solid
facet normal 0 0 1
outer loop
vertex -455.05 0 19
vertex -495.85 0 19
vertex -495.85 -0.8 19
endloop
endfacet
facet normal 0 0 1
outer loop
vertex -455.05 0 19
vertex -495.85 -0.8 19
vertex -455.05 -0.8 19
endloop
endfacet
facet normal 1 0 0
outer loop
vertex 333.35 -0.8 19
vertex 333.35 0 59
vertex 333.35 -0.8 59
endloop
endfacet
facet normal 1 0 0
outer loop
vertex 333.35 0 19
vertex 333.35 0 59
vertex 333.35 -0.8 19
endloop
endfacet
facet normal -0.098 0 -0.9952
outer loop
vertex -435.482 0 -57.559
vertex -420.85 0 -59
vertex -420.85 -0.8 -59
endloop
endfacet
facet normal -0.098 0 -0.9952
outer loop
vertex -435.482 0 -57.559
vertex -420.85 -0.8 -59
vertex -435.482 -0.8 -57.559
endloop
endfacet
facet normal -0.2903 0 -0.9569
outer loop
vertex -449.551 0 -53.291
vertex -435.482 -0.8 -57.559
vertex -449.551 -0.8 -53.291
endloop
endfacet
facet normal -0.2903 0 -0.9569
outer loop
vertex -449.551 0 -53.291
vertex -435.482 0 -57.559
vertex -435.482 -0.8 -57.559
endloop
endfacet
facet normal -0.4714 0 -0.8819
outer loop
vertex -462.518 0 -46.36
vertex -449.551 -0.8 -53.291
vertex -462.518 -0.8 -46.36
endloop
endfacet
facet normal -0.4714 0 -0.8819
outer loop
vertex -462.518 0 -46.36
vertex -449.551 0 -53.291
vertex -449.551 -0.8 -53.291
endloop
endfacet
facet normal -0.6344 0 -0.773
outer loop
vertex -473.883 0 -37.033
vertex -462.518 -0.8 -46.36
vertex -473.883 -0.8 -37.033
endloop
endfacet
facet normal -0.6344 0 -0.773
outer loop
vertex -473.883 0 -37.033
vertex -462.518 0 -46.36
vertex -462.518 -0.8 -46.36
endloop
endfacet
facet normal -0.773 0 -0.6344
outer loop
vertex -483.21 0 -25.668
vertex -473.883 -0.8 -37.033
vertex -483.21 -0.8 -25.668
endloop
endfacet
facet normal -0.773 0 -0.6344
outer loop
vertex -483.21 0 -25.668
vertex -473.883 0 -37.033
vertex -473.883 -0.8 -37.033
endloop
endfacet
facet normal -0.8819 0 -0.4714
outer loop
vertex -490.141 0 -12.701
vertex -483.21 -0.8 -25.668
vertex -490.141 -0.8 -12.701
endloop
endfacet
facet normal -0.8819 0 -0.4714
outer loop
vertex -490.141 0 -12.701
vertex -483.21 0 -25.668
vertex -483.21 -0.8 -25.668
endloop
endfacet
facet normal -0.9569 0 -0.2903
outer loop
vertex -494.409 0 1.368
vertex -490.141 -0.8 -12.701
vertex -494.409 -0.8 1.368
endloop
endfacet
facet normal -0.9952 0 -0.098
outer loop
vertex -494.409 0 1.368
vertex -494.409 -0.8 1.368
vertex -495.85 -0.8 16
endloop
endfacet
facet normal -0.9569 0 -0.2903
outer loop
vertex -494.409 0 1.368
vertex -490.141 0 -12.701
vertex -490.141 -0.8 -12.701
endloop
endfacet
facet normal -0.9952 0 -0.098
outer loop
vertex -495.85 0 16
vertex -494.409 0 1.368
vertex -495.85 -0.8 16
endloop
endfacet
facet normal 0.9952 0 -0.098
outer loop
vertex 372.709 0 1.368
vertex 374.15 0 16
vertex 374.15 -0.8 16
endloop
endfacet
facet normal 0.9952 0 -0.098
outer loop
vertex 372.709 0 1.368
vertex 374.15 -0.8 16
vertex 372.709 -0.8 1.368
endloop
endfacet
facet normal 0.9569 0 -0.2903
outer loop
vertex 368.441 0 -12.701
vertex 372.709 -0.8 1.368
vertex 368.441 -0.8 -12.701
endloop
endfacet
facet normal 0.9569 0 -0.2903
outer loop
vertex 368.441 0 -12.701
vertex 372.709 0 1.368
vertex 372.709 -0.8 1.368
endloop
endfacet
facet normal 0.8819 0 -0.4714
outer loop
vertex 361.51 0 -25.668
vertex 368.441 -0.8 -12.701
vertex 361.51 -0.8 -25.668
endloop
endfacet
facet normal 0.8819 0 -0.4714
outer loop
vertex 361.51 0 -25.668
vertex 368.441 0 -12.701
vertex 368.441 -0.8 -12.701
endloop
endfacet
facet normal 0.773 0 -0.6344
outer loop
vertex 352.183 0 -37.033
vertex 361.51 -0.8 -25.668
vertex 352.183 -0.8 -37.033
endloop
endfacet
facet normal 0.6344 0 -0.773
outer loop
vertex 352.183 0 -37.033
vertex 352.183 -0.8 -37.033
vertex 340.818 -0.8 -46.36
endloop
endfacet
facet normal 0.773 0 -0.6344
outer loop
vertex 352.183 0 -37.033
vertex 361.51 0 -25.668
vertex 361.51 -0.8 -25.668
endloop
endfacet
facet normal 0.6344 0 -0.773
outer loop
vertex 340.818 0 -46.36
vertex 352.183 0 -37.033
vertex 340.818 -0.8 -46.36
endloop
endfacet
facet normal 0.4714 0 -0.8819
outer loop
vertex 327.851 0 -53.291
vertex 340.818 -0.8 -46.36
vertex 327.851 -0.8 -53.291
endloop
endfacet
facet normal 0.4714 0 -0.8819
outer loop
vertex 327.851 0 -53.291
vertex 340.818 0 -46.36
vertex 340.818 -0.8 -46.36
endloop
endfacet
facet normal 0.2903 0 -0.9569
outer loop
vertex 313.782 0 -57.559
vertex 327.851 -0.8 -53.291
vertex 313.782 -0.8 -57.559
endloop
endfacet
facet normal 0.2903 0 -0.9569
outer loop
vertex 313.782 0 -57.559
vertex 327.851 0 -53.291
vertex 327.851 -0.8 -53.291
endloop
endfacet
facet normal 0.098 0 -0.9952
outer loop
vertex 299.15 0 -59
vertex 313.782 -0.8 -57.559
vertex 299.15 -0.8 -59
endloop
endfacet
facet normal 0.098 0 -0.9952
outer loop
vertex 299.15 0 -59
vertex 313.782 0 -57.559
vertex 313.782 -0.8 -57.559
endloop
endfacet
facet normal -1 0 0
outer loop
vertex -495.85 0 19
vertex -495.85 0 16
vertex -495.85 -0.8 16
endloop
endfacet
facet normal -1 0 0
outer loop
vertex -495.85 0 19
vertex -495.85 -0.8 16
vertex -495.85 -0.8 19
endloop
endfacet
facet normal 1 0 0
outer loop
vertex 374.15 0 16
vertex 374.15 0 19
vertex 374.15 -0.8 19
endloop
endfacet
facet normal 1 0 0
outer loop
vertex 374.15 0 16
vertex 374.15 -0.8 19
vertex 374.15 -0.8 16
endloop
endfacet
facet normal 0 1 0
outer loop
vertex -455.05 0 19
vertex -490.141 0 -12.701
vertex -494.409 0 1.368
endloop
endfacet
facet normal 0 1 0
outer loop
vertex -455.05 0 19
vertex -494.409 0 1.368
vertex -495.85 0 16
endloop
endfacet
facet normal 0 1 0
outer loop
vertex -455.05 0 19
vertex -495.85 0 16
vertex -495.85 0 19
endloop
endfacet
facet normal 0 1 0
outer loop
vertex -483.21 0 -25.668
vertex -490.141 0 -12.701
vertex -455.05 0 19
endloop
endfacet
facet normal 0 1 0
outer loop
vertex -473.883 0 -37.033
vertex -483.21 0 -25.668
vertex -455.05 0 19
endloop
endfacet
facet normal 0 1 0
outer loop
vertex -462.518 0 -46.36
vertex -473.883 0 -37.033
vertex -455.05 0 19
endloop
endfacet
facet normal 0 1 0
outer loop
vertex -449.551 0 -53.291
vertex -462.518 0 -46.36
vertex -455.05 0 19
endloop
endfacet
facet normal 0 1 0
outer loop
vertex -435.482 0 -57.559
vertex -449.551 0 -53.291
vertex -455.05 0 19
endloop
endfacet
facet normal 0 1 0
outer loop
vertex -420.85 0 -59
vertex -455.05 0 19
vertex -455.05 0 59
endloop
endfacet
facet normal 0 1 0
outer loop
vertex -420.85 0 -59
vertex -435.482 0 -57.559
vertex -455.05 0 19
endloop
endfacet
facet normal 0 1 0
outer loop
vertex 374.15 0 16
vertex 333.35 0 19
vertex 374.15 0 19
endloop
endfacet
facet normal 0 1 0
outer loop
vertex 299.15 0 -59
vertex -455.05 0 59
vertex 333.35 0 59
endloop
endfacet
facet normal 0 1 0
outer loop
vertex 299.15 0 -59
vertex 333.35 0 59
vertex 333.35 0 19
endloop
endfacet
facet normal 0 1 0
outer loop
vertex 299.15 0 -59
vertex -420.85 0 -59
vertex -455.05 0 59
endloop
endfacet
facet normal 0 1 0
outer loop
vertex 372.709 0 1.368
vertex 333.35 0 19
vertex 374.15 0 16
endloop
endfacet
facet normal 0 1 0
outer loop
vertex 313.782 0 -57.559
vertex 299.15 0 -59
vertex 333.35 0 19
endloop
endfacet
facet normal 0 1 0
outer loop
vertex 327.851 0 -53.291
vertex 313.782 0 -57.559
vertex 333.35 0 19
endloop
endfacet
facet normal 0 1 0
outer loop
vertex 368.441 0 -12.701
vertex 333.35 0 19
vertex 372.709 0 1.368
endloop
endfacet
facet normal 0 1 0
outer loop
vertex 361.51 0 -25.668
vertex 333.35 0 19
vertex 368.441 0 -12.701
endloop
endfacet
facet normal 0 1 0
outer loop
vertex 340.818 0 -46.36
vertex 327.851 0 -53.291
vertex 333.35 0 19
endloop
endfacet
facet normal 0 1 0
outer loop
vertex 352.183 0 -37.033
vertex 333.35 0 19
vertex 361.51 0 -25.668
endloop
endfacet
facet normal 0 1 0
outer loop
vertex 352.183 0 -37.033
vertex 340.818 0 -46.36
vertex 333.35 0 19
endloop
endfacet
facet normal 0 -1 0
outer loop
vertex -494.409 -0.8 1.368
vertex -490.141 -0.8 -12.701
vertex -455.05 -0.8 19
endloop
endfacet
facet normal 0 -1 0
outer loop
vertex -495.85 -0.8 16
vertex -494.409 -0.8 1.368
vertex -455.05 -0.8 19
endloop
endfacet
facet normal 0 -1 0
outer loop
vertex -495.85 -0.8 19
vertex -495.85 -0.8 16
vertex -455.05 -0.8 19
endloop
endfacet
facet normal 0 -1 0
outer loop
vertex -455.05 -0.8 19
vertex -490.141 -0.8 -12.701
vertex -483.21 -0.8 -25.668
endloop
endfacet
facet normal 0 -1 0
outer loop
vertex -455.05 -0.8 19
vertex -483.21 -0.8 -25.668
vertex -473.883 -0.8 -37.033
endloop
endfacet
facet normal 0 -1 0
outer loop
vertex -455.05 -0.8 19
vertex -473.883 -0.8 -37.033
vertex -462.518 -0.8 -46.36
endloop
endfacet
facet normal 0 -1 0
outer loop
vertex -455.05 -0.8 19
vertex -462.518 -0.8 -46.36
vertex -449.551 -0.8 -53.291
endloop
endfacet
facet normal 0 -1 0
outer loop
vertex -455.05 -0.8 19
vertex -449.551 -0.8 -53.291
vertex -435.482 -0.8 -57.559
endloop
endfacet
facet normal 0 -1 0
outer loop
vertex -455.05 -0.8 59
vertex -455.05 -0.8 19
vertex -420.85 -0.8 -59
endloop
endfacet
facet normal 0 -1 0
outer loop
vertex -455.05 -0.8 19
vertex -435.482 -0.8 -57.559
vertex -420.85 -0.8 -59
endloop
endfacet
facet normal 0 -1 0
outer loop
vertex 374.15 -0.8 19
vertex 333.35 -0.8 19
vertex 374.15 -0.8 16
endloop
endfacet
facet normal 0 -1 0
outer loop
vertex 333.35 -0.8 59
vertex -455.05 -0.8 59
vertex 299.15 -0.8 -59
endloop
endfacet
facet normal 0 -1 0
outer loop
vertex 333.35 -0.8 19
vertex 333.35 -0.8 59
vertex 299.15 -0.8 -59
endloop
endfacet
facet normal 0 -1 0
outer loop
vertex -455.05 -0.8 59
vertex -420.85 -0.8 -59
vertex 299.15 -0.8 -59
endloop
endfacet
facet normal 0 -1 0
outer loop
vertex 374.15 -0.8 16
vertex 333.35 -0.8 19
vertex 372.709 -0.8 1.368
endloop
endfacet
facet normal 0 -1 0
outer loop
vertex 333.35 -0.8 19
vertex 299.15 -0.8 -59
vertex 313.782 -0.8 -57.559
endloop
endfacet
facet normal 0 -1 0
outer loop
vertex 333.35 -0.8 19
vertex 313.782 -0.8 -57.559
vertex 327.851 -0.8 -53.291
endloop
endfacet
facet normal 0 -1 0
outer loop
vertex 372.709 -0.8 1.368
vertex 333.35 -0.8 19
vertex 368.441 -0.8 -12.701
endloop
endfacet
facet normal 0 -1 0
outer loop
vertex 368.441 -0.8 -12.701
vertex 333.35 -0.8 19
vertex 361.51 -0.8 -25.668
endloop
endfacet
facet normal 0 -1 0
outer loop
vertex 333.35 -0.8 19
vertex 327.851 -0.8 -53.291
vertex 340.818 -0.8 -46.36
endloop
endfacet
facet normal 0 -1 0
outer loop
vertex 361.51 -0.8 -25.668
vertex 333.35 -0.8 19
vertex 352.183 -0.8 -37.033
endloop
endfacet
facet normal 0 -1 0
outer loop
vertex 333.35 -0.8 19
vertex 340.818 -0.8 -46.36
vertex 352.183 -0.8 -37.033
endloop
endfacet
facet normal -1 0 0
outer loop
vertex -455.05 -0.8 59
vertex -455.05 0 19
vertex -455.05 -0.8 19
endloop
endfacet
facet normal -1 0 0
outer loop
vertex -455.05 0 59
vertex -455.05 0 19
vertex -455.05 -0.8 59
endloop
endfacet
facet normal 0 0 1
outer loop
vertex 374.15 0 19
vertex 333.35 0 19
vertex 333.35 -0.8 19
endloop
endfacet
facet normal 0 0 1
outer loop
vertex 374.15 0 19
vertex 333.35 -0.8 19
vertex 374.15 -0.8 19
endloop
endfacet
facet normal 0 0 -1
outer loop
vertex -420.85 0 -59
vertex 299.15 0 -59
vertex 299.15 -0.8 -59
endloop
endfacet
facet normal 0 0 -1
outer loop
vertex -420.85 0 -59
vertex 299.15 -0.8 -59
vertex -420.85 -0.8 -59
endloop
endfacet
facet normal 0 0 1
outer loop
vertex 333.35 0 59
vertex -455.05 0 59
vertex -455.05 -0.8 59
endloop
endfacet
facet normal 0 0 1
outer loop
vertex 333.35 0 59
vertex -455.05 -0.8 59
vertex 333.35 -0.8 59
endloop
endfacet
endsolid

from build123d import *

# Parameters (mm, degrees)
BASE_FLANGE1_DEPTH = 0.8


# Sheet-metal steps are written as plain solids
with BuildPart() as part:
    # Sketch1 → Base-Flange1 (new body)
    with BuildSketch(Plane(origin=(0, 0, 0), x_dir=(1, 0, 0), z_dir=(0, 1, 0))):
        with BuildLine():
            Line((-455.05, -59), (333.35, -59))
            Line((333.35, -59), (333.35, -19))
            Line((333.35, -19), (374.15, -19))
            Line((374.15, -19), (374.15, -16))
            ThreePointArc((374.15, -16), (352.183008589, 37.033008589), (299.15, 59))
            Line((299.15, 59), (-420.85, 59))
            ThreePointArc((-420.85, 59), (-473.883008589, 37.033008589), (-495.85, -16))
            Line((-495.85, -16), (-495.85, -19))
            Line((-495.85, -19), (-455.05, -19))
            Line((-455.05, -19), (-455.05, -59))
        make_face()
    extrude(amount=-BASE_FLANGE1_DEPTH)


solid = part.part
